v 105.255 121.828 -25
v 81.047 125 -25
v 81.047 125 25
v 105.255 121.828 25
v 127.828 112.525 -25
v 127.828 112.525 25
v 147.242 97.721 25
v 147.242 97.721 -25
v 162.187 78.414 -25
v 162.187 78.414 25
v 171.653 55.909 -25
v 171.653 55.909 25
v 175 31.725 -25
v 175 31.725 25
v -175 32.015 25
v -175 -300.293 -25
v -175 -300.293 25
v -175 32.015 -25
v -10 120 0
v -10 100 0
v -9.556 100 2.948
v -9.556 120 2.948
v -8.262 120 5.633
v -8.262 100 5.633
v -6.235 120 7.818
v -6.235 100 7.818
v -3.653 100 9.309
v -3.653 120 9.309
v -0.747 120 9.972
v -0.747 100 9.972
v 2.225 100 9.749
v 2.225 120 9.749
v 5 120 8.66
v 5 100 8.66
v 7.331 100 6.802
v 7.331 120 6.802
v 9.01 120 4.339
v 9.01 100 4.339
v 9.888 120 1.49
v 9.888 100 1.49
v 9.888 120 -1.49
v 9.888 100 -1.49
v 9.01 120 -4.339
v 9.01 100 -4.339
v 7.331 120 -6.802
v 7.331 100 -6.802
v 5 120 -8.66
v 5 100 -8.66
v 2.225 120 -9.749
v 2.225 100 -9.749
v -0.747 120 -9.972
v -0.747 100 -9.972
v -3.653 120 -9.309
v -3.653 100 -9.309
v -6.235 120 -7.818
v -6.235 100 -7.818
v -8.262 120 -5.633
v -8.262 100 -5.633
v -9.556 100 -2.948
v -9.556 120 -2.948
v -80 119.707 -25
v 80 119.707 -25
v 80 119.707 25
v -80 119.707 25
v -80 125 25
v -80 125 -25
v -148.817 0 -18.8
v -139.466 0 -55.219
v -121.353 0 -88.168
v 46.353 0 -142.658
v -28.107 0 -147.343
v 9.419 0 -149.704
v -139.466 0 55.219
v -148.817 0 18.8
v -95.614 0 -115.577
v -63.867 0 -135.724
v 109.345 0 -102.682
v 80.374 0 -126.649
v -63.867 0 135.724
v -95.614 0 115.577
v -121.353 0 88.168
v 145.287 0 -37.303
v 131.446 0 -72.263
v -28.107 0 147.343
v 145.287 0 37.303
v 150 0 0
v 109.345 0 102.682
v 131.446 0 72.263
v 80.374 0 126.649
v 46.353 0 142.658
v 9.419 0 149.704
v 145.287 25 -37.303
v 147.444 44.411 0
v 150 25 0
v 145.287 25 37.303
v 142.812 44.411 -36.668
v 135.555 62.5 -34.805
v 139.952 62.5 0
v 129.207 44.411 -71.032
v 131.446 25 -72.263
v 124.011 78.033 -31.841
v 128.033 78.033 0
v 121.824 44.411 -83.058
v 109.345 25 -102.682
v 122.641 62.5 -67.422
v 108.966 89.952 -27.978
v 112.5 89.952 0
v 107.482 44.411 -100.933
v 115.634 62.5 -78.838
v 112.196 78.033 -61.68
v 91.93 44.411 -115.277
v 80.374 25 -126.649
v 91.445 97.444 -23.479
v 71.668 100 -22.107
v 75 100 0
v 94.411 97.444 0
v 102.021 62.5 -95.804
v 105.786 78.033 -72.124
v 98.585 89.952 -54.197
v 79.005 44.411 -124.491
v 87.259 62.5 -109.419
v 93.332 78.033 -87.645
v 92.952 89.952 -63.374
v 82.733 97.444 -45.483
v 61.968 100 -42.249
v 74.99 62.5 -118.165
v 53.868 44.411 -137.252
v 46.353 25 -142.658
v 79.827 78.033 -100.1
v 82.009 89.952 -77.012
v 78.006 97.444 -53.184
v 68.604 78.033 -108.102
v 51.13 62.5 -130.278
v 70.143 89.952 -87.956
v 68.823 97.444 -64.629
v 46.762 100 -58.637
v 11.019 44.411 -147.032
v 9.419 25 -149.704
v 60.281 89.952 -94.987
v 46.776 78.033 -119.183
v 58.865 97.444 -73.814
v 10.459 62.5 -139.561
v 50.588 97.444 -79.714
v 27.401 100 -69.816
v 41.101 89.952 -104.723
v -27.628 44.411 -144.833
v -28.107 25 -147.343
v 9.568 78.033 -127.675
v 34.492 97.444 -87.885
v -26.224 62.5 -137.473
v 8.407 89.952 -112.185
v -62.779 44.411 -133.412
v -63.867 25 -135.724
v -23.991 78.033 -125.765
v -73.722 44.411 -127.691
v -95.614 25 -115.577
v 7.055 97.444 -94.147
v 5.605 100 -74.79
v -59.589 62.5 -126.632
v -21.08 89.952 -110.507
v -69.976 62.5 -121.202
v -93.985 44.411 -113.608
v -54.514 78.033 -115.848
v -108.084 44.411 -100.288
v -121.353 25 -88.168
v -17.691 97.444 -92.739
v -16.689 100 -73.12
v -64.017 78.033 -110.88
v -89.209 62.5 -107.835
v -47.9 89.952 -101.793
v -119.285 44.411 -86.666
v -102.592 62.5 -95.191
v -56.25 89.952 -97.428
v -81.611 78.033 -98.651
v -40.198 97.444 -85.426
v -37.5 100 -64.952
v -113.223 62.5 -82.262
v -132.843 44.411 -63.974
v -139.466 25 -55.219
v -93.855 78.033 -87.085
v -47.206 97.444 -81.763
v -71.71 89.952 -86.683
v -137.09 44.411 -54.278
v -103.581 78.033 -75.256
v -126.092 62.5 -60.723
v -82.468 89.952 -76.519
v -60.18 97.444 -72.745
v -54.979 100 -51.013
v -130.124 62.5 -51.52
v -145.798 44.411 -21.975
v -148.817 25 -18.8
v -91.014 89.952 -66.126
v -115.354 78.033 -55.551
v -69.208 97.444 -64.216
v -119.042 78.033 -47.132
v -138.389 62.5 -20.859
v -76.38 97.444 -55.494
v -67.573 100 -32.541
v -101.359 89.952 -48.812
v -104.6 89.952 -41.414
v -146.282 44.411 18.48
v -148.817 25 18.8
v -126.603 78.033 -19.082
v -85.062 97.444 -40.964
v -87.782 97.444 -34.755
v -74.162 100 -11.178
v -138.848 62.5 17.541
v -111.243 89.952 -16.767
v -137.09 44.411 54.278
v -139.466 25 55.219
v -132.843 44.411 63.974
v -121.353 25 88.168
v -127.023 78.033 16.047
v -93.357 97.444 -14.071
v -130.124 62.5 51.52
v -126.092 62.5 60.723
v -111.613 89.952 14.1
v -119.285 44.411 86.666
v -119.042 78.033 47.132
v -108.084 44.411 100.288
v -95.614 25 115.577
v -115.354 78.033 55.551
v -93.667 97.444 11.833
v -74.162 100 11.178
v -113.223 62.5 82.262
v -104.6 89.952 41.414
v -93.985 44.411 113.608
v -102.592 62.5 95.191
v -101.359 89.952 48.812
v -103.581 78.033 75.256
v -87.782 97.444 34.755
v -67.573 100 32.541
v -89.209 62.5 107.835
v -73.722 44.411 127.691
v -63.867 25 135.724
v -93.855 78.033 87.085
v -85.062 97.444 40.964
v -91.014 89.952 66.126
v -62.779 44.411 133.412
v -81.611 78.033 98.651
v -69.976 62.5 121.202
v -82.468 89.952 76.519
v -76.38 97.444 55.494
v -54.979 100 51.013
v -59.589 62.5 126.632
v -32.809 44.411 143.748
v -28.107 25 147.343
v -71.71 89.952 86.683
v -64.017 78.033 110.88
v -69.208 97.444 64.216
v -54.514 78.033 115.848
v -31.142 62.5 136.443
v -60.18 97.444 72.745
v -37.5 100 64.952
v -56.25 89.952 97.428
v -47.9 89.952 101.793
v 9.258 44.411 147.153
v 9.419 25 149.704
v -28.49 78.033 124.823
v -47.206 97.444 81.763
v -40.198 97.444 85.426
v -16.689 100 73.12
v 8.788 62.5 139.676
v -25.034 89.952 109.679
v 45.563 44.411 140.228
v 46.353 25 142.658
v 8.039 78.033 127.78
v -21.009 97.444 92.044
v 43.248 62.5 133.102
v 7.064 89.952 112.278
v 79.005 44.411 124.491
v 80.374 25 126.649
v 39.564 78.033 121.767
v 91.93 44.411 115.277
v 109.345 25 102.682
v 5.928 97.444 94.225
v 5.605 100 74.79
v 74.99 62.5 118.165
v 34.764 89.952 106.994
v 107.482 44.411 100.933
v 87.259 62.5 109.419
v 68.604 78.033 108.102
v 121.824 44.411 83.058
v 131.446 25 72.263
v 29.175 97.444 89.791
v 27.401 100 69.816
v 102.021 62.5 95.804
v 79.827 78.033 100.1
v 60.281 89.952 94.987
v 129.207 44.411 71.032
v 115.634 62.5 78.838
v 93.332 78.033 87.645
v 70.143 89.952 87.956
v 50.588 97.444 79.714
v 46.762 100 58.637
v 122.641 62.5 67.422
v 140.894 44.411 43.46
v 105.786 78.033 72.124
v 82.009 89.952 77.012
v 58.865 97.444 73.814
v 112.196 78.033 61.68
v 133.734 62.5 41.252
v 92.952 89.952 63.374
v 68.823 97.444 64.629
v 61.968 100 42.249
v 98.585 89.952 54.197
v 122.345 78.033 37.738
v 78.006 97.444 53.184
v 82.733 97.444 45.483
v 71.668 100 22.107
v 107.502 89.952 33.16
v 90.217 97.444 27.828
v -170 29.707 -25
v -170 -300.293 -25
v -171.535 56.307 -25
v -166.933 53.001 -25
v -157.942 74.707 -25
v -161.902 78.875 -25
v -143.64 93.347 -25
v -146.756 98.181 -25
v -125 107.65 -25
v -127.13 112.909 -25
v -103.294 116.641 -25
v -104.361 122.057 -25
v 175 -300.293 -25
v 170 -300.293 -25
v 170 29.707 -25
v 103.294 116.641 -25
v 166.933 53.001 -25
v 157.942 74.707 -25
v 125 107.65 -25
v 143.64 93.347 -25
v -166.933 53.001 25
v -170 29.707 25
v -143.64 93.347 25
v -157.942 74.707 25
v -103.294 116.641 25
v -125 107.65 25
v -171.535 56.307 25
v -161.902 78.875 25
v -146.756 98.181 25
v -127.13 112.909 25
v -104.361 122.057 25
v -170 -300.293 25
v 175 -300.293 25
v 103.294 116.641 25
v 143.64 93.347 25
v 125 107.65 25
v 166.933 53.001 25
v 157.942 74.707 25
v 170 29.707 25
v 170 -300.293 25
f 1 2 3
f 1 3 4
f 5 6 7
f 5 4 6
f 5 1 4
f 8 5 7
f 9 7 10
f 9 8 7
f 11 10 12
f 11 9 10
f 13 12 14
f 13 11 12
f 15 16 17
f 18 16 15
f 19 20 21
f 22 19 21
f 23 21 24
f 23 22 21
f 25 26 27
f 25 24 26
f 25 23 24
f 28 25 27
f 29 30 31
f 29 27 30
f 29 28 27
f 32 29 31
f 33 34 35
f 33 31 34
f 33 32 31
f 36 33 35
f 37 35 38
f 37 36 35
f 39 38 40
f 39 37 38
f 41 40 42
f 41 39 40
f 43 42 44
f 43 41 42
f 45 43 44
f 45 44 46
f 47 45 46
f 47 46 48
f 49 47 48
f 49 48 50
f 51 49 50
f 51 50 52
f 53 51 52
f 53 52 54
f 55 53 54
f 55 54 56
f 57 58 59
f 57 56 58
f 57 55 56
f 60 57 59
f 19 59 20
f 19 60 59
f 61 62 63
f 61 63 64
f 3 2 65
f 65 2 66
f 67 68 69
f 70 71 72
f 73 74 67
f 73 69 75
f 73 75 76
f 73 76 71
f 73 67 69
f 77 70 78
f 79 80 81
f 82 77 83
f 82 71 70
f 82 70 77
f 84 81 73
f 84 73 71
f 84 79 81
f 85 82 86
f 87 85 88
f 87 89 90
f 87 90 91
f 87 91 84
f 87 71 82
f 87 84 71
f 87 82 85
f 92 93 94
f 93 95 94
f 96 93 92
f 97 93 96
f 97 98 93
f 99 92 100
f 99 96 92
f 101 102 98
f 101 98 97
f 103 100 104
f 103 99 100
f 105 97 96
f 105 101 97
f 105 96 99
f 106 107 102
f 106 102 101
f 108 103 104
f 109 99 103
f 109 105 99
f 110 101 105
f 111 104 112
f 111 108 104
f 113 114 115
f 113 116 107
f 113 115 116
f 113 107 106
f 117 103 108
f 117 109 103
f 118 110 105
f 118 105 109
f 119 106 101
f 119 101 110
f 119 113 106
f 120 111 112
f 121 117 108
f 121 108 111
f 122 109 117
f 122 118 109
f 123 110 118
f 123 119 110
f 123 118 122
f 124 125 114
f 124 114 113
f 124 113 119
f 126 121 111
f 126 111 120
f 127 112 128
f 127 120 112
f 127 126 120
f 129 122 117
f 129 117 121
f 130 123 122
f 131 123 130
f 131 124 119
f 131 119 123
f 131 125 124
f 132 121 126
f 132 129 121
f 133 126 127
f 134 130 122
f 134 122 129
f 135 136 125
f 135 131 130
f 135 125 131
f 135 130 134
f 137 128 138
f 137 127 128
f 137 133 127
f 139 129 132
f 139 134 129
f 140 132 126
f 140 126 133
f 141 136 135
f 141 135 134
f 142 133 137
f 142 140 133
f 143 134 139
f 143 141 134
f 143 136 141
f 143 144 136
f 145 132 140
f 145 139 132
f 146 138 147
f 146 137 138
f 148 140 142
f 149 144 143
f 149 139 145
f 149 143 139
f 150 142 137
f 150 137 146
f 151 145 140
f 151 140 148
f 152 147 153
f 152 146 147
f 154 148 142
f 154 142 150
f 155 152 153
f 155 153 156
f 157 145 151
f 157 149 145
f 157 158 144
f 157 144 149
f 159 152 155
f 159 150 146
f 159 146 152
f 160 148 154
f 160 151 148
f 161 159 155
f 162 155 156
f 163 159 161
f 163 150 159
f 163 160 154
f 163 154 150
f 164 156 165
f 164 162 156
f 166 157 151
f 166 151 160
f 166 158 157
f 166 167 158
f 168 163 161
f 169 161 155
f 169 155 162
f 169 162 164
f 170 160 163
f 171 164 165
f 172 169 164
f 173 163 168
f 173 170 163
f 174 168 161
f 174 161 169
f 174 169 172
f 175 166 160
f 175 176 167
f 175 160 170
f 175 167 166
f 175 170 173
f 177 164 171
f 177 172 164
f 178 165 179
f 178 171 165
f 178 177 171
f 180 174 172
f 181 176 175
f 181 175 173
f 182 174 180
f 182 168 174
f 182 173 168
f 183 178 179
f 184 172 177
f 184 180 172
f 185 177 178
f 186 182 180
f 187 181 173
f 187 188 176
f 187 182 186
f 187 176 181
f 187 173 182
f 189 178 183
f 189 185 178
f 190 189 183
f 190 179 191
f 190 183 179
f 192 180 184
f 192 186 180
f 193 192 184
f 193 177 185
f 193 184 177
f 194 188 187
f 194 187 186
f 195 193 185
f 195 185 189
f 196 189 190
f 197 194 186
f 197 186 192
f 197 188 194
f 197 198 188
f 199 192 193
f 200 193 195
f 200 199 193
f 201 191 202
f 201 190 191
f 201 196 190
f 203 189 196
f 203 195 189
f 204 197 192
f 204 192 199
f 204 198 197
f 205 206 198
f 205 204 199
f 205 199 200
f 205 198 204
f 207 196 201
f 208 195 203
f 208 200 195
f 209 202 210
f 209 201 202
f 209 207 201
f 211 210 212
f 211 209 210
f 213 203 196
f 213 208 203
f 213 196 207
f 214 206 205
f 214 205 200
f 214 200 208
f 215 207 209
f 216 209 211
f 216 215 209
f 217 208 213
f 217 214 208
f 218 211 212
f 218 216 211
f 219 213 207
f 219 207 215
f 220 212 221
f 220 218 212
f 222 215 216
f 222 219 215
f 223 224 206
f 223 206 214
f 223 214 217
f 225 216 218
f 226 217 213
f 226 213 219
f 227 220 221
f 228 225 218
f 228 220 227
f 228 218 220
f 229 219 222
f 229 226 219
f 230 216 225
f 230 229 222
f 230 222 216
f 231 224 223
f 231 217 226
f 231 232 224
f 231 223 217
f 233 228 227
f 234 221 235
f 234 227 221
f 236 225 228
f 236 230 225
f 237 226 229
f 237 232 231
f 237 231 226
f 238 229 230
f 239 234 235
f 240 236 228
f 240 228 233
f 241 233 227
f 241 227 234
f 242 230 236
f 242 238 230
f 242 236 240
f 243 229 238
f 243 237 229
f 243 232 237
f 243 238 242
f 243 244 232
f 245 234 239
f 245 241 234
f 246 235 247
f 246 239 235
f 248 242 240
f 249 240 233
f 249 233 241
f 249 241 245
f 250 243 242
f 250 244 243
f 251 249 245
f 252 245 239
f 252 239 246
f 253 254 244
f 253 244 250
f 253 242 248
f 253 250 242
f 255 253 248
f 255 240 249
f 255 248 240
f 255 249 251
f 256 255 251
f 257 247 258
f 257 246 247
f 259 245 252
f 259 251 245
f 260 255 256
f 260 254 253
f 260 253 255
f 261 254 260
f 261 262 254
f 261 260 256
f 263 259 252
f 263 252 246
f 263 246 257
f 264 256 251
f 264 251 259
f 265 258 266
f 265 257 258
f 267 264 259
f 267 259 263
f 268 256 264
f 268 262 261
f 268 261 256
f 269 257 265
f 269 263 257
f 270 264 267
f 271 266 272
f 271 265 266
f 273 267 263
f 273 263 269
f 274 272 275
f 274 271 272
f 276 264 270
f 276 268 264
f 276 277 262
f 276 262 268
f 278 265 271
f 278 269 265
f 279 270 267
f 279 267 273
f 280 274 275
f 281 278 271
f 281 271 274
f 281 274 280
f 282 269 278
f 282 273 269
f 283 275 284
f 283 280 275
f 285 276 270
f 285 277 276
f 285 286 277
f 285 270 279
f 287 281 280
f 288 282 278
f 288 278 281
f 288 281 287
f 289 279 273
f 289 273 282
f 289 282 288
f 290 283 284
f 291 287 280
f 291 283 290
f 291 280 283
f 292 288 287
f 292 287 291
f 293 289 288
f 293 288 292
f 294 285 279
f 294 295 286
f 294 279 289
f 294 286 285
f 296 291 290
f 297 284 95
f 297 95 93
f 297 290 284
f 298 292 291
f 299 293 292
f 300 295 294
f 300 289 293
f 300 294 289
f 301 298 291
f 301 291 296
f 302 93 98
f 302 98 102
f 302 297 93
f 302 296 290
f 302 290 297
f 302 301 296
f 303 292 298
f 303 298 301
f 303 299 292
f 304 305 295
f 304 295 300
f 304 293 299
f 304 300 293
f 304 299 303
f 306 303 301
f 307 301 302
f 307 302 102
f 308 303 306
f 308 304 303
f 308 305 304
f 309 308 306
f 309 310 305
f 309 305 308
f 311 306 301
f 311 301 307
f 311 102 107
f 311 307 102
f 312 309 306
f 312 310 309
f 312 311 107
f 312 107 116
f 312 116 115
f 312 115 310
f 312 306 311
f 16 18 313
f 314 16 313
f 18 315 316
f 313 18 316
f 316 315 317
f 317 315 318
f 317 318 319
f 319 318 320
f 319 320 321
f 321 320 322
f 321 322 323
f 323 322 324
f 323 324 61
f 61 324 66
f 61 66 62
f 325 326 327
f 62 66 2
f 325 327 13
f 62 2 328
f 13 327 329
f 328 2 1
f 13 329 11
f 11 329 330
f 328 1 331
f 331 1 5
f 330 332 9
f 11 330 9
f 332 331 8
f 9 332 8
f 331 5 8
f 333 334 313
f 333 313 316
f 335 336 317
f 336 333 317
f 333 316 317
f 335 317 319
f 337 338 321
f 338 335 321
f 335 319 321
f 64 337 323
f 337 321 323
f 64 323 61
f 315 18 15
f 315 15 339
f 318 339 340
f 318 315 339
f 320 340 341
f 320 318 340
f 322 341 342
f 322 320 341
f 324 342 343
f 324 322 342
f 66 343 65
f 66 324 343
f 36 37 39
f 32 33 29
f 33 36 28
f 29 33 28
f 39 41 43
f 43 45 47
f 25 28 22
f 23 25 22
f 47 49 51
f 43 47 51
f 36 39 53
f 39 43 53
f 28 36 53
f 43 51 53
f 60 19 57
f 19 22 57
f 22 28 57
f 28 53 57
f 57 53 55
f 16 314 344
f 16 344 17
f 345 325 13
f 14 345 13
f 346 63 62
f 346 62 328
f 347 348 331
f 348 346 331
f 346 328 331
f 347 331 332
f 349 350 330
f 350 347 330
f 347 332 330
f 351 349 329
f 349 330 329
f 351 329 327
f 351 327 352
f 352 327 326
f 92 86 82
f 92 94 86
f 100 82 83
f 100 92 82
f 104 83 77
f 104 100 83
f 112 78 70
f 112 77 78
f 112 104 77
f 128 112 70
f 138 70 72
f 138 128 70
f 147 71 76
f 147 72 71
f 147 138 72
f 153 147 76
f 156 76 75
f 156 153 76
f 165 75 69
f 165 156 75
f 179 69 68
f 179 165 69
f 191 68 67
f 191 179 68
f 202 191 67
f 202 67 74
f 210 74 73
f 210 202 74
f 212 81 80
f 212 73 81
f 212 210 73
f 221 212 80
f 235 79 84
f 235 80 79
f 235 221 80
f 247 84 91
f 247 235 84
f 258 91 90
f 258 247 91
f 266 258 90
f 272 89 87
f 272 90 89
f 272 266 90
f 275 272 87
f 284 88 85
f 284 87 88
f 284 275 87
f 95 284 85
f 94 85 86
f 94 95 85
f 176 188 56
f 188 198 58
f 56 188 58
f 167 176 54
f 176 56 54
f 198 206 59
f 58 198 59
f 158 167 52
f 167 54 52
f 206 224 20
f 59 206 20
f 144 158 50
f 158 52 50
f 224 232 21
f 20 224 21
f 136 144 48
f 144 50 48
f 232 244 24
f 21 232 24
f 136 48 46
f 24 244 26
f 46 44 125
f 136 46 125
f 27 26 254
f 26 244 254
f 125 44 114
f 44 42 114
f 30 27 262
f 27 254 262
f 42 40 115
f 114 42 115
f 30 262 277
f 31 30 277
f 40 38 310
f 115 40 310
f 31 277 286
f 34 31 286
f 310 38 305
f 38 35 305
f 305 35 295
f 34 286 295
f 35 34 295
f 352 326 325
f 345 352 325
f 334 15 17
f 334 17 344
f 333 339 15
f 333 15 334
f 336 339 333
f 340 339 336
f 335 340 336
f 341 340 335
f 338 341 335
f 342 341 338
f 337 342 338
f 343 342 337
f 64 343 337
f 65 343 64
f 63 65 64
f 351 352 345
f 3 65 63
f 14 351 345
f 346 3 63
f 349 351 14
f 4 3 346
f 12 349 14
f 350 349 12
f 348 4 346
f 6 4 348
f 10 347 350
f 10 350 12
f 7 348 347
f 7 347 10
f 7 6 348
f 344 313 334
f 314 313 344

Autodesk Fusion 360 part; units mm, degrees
sketch "Sketch1" plane through (0, 0, 0) normal (0, 0, 1) x (1, 0, 0)
  line L0 (0, 0) -> (150, 0)
  line L1 (150, 0) -> (150, 25)
  line L2 (75, 100) -> (0, 100)
  line L3 (0, 100) -> (0, 0)
  arc A0 (150, 25) -> (75, 100) centre (75, 25) ccw
  dimension "d1" = 150
  dimension "d2" = 100
  dimension "d3" = 75
revolve "Revolve1" add sketch "Sketch1" angle 360 about axis through (0, 100, 0) along (0, -1, 0) makes body 1
sketch "Sketch2" plane through (0, 0, 0) normal (0, 0, 1) x (1, 0, 0)
  line L0 (0, 100) -> (-10, 100)
  line L1 (-10, 100) -> (-10, 120)
  line L2 (-10, 120) -> (0, 120)
  line L3 (0, 120) -> (0, 100)
revolve "Revolve2" add sketch "Sketch2" angle 360 about axis through (0, 120, 0) along (0, -1, 0) bodies 1
sketch "Sketch3" plane through (0, 0, 0) normal (0, 0, 1) x (1, 0, 0)
  line L0 (-0.1829, 119.7073) -> (-80, 119.7073)
  arc A0 (-80, 119.7073) -> (-170, 29.7073) centre (-80, 29.7073) ccw
  line L1 (-170, 29.7073) -> (-170, -0.2927)
  line L2 (-170, -0.2927) -> (-170, -300.2927)
  line L3 (0, 119.7073) -> (-80, 119.7073)
  arc A1 (-80, 119.7073) -> (-170, 29.7073) centre (-80, 29.7073) ccw
  line L4 (-170, -0.2927) -> (-170, -300.2927)
  line L5 (-170, 29.7073) -> (-170, -0.2927)
  line L6 (0, 119.7073) -> (80, 119.7073)
  arc A2 (170, 29.7073) -> (80, 119.7073) centre (80, 29.7073) ccw
  line L7 (170, 29.7073) -> (170, -0.2927)
  line L8 (170, -0.2927) -> (170, -300.2927)
  line L9 (170, -300.2927) -> (175, -300.2927)
  line L10 (175, -300.2927) -> (175, 31.7247)
  line L11 (0, 125) -> (80, 125)
  line L12 (80, 125) -> (81.0467, 125)
  arc A3 (175, 31.7247) -> (81.0467, 125) centre (81.0467, 31.0442) ccw
  line L13 (0, 125) -> (-80, 125)
  arc A4 (-80, 125) -> (-175, 32.0149) centre (-81.0006, 31.0004) ccw
  line L14 (-175, -300.2927) -> (-175, 32.0149)
  line L15 (-170, -300.2927) -> (-175, -300.2927)
  dimension "d6" = 300
  dimension "d7" = 300
  dimension "d8" = 5
extrude "Extrude1" add sketch "Sketch3" along normal blind 25 and the other way blind 25 separate body makes body 2
sketch "Sketch4" plane through (175, 0, 0) normal (1, 0, 0) x (0, 0, -1)
  line L0 (25, 31.7247) -> (-25, 31.7247)
  line L1 (-25, 31.7247) -> (-25, -300.2927)
  line L2 (-25, -300.2927) -> (25, -300.2927)
  line L3 (25, -300.2927) -> (25, 31.7247)
  line L4 (0, -300.2927) -> (-125, -300.2927)
  line L5 (-125, -250.2927) -> (0, -250.2927)
  line L6 (0, -250.2927) -> (0, -300.2927)
  line L7 (125, -250.2927) -> (0, -250.2927)
  line L8 (0, -300.2927) -> (125, -300.2927)
  arc A0 (-125, -250.2927) -> (-150, -275.2927) centre (-125, -275.2927) ccw
  arc A1 (-150, -275.2927) -> (-125, -300.2927) centre (-125, -275.2927) ccw
  arc A2 (150, -275.2927) -> (125, -250.2927) centre (125, -275.2927) ccw
  arc A3 (125, -300.2927) -> (150, -275.2927) centre (125, -275.2927) ccw
  point P0 (-150, -300.2927)
  dimension "d13" = 150
  dimension "d14" = 50
  dimension "d15" = 25
